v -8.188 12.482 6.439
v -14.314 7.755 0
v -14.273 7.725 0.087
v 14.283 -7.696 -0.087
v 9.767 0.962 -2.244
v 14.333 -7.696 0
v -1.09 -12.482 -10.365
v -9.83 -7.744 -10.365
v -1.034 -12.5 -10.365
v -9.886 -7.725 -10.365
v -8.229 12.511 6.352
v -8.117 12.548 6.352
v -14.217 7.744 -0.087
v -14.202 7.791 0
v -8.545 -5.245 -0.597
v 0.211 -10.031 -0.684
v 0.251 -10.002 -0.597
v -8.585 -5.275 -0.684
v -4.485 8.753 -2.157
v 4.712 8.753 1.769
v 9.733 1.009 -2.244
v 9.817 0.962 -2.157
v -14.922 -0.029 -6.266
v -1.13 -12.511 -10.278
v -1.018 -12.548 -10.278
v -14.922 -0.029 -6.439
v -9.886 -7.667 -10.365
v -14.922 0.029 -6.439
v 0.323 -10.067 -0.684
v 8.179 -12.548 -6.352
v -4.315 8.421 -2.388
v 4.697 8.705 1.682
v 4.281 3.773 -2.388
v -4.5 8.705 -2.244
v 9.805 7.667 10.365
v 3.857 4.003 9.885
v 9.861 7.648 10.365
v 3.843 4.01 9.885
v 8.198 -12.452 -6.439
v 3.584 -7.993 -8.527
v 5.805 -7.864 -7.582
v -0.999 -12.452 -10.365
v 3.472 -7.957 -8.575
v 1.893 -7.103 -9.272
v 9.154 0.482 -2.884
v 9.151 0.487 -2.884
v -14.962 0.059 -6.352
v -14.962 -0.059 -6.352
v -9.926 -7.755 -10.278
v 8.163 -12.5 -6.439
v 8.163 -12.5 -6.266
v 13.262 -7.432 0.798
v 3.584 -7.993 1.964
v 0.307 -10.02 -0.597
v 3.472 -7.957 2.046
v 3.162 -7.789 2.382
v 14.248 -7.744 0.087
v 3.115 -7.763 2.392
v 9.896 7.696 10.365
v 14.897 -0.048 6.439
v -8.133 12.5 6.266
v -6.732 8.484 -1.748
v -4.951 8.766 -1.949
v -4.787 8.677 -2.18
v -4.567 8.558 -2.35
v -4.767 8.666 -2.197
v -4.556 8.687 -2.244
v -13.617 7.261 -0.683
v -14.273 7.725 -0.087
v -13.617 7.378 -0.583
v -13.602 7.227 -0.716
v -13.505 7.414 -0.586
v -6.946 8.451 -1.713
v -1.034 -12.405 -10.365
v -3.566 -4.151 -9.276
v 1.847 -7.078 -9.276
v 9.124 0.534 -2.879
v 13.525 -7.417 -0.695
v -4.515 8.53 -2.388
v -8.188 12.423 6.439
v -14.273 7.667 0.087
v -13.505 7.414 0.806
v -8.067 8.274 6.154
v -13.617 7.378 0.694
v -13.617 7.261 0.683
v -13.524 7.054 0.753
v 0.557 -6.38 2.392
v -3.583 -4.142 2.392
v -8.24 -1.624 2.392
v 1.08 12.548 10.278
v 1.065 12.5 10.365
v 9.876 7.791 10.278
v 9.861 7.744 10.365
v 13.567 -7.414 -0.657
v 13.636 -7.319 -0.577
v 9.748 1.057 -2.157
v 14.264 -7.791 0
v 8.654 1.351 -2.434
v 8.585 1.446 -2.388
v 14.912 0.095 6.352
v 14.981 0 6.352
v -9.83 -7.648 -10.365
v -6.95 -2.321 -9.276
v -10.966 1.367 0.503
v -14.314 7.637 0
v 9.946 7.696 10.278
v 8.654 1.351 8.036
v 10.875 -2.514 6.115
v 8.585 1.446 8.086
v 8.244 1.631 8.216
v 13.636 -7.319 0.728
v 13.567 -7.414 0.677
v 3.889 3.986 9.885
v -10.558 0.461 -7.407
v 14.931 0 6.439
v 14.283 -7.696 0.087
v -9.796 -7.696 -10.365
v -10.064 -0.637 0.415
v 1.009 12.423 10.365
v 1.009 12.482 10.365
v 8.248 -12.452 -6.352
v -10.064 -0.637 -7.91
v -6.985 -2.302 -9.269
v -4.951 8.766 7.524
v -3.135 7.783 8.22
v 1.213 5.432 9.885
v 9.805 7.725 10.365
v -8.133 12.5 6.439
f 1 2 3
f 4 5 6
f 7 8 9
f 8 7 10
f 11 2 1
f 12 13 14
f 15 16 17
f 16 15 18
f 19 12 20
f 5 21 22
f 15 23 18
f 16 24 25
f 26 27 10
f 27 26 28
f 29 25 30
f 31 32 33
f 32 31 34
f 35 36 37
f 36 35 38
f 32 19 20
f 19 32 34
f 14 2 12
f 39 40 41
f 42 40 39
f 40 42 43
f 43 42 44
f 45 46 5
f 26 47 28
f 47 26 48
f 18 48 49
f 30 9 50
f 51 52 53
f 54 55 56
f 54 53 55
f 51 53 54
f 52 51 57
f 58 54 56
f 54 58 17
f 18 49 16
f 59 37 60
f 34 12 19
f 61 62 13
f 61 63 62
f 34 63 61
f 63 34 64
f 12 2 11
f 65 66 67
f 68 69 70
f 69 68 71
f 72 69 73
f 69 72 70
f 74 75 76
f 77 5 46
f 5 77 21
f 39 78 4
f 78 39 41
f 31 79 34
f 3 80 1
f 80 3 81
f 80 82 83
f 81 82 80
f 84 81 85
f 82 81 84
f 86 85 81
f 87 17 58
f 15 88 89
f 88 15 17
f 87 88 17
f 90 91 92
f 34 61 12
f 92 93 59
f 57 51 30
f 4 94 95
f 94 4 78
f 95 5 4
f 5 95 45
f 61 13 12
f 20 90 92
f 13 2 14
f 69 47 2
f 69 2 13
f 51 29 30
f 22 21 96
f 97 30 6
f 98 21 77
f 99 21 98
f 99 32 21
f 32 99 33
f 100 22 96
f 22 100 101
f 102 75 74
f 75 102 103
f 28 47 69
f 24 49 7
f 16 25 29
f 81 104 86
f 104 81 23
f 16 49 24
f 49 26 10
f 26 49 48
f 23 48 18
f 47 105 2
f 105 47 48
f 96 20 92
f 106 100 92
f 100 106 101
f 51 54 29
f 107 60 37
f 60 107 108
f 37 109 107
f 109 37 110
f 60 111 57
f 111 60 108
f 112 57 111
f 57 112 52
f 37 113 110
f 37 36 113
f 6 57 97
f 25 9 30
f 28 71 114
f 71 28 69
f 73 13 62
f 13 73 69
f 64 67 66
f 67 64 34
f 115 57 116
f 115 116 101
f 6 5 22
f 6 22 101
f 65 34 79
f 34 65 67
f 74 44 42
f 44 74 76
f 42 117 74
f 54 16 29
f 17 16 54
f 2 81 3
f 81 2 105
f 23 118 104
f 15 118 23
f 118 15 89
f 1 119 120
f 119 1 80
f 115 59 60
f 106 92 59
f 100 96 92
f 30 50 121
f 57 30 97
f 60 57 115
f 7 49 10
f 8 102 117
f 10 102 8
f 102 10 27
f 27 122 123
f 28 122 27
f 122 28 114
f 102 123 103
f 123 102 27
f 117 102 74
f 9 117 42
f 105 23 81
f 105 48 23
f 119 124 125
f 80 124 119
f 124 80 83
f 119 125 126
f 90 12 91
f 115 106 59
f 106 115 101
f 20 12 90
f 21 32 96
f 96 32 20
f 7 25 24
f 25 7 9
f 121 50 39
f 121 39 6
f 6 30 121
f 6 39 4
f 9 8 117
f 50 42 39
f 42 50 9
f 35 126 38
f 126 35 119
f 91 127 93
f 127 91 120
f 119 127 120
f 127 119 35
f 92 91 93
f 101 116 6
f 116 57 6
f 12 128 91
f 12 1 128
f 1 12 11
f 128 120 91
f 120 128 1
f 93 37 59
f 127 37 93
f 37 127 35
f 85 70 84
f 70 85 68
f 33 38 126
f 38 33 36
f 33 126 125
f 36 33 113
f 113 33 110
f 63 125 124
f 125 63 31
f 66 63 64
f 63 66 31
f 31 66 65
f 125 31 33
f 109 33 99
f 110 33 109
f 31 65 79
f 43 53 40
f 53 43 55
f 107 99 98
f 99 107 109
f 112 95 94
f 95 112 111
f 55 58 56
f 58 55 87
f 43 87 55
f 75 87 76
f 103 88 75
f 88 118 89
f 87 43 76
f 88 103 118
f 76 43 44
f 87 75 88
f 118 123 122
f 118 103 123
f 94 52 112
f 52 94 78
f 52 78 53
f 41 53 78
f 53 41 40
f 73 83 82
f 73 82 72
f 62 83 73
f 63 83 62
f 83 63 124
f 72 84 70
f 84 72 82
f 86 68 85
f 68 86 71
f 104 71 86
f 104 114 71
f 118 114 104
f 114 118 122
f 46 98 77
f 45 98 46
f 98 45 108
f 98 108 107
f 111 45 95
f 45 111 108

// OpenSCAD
// Auto-generated OpenSCAD file

    inner_points = 10*[[-1.7845387792055995e-15, -1.859095349230593e-15, -1.618033988749895], [1.7845387792055995e-15, 1.859095349230593e-15, 1.618033988749895], [-1.3536265463755464, 0.7319352168718941, -0.49999999999999933], [-1.3536265463755455, 0.7319352168718953, 0.5000000000000007], [1.3536265463755455, -0.7319352168718953, -0.5000000000000007], [1.3536265463755464, -0.7319352168718941, 0.49999999999999933], [-0.8365872137342245, 0.45236084158985485, -1.309016994374947], [-0.8365872137342216, 0.4523608415898579, 1.309016994374948], [0.8365872137342216, -0.4523608415898579, -1.309016994374948], [0.8365872137342245, -0.45236084158985485, 1.309016994374947], [-0.9983252747658171, -0.0578502010692763, 1.1675275179479784e-15], [-0.49820742844767774, 0.8670578747924227, -4.467599515296164e-16], [-0.48128594212449544, -0.3374245763513155, -0.8090169943749466], [0.018831904193644222, 0.5874834995103835, -0.8090169943749481], [-0.4812859421244936, -0.3374245763513135, 0.8090169943749483], [0.018831904193646, 0.5874834995103853, 0.8090169943749468], [0.35530127160972824, -0.7897854179411714, -0.4999999999999995], [0.8554191179278678, 0.13512265792052747, -0.5000000000000011], [0.3553012716097293, -0.7897854179411703, 0.5000000000000006], [0.8554191179278688, 0.13512265792052863, 0.4999999999999989]];

    outer_points = 10*[[-1.4881280115199031, 0.0, -0.6352235906196446], [1.4881280115199031, 0.0, 0.6352235906196446], [-0.10491467048796077, -1.2452425677866739, -1.0278121657376647], [0.8147990202421345, -1.2452425677866739, -0.6352223962789754], [-0.8147990202421345, 1.2452425677866739, 0.6352223962789754], [0.10491467048796077, 1.2452425677866739, 1.0278121657376647], [-0.9845545230101506, -0.7696022311303593, -1.027812621935206], [1.423287179239848, -0.7696022311303593, 7.381431278430384e-07], [-1.423287179239848, 0.7696022311303593, -7.381431278430384e-07], [0.9845545230101506, 0.7696022311303593, 1.027812621935206], [0.36322496660595616, -0.37947419135933846, -0.8509212429633416], [0.029189450705503803, -0.9972321321950521, -0.06838165313313897], [-0.5164148859162335, 0.09616614529697598, -0.8509216991608831], [-0.8504504018166859, -0.5215917955387377, -0.06838210933068053], [0.9717131256036696, 0.09616614529697598, -0.2156981085412385], [0.6376776097032173, -0.5215917955387377, 0.566841481288964], [-0.45157405363617825, 0.8657683764273354, -0.21569884668436626], [-0.7856095695366306, 0.24801043559162173, 0.5668407431458362], [0.468139637093917, 0.8657683764273354, 0.17689092277432297], [0.1341041211934646, 0.24801043559162173, 0.9594305126045255]];

    // Convex hull for inner set (I)
    module inner_hull() {
        hull() {
            for (p = inner_points) {
                translate(p) sphere(r=0.1);
            }
        }
    }

    // Convex hull for outer set (O) minus inner hull (O \ I)
    module outer_minus_inner() {
        difference() {
            hull() {
                for (p = outer_points) {
                    translate(p) sphere(r=0.1);
                }
            }
            inner_hull(); // Subtract inner hull
        }
    }

    // Convex hull for outer set (O) minus all translated inner hulls
    module outer_minus_AllTranslationInner() {
        difference() {
            hull() {
                for (p = outer_points) {
                    translate(p) sphere(r=0.1);
                }
            }
            hull() {
                translate([0,0,50]) inner_hull();
                translate([0,0,-50]) inner_hull();
            }; // Subtract translated inner hulls
        }
    }

    // Difference between outer_minus_inner and outer_minus_AllTranslationInner
    module outer_minus_inner_diff() {
        difference() {
            // Outer minus inner
            difference() {
                hull() {
                    for (p = outer_points) {
                        translate(p) sphere(r=0.1);
                    }
                }
                inner_hull();
            }

            // Subtract Outer minus AllTranslationInner
            difference() {
                hull() {
                    for (p = outer_points) {
                        translate(p) sphere(r=0.1);
                    }
                }
                hull() {
                    translate([0,0,50]) inner_hull();
                    translate([0,0,-50]) inner_hull();
                };
            }
        }
    }

    // Rendering all with colors applied
    color([0, 1, 0, 1]) outer_minus_AllTranslationInner(); // Opaque green
    
